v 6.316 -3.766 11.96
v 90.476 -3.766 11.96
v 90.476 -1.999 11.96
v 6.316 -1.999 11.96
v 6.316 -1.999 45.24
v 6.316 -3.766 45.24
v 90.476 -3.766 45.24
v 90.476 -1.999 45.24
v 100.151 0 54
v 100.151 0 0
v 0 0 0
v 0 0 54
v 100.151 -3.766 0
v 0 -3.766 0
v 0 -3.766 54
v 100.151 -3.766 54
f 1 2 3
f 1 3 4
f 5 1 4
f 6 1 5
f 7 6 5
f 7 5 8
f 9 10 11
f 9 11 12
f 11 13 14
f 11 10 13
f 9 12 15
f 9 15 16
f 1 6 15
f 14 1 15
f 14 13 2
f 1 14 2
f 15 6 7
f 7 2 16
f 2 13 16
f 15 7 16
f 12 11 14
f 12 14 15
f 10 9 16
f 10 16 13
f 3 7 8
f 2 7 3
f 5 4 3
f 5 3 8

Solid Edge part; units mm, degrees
sketch "Sketch1" plane through (0, 0, 0) normal (0, -1, 0) x (1, 0, 0)
  line L0 (100.1511, 54) -> (100.1511, 0)
  line L1 (100.1511, 0) -> (0, 0)
  line L2 (0, 0) -> (0, 54)
  line L3 (0, 54) -> (100.1511, 54)
extrude "Protrusion1" add sketch "Sketch1" along normal blind 3.7656
sketch "Sketch2" plane through (50.0756, -3.7656, 27) normal (0, -1, 0) x (1, 0, 0)
  line L0 (40.4, -15.04) -> (-43.76, -15.04)
  line L1 (-43.76, -15.04) -> (-43.76, 18.24)
  line L2 (-43.76, 18.24) -> (40.4, 18.24)
  line L3 (40.4, 18.24) -> (40.4, -15.04)
extrude "Cutout1" cut sketch "Sketch2" against normal blind 1.7665
